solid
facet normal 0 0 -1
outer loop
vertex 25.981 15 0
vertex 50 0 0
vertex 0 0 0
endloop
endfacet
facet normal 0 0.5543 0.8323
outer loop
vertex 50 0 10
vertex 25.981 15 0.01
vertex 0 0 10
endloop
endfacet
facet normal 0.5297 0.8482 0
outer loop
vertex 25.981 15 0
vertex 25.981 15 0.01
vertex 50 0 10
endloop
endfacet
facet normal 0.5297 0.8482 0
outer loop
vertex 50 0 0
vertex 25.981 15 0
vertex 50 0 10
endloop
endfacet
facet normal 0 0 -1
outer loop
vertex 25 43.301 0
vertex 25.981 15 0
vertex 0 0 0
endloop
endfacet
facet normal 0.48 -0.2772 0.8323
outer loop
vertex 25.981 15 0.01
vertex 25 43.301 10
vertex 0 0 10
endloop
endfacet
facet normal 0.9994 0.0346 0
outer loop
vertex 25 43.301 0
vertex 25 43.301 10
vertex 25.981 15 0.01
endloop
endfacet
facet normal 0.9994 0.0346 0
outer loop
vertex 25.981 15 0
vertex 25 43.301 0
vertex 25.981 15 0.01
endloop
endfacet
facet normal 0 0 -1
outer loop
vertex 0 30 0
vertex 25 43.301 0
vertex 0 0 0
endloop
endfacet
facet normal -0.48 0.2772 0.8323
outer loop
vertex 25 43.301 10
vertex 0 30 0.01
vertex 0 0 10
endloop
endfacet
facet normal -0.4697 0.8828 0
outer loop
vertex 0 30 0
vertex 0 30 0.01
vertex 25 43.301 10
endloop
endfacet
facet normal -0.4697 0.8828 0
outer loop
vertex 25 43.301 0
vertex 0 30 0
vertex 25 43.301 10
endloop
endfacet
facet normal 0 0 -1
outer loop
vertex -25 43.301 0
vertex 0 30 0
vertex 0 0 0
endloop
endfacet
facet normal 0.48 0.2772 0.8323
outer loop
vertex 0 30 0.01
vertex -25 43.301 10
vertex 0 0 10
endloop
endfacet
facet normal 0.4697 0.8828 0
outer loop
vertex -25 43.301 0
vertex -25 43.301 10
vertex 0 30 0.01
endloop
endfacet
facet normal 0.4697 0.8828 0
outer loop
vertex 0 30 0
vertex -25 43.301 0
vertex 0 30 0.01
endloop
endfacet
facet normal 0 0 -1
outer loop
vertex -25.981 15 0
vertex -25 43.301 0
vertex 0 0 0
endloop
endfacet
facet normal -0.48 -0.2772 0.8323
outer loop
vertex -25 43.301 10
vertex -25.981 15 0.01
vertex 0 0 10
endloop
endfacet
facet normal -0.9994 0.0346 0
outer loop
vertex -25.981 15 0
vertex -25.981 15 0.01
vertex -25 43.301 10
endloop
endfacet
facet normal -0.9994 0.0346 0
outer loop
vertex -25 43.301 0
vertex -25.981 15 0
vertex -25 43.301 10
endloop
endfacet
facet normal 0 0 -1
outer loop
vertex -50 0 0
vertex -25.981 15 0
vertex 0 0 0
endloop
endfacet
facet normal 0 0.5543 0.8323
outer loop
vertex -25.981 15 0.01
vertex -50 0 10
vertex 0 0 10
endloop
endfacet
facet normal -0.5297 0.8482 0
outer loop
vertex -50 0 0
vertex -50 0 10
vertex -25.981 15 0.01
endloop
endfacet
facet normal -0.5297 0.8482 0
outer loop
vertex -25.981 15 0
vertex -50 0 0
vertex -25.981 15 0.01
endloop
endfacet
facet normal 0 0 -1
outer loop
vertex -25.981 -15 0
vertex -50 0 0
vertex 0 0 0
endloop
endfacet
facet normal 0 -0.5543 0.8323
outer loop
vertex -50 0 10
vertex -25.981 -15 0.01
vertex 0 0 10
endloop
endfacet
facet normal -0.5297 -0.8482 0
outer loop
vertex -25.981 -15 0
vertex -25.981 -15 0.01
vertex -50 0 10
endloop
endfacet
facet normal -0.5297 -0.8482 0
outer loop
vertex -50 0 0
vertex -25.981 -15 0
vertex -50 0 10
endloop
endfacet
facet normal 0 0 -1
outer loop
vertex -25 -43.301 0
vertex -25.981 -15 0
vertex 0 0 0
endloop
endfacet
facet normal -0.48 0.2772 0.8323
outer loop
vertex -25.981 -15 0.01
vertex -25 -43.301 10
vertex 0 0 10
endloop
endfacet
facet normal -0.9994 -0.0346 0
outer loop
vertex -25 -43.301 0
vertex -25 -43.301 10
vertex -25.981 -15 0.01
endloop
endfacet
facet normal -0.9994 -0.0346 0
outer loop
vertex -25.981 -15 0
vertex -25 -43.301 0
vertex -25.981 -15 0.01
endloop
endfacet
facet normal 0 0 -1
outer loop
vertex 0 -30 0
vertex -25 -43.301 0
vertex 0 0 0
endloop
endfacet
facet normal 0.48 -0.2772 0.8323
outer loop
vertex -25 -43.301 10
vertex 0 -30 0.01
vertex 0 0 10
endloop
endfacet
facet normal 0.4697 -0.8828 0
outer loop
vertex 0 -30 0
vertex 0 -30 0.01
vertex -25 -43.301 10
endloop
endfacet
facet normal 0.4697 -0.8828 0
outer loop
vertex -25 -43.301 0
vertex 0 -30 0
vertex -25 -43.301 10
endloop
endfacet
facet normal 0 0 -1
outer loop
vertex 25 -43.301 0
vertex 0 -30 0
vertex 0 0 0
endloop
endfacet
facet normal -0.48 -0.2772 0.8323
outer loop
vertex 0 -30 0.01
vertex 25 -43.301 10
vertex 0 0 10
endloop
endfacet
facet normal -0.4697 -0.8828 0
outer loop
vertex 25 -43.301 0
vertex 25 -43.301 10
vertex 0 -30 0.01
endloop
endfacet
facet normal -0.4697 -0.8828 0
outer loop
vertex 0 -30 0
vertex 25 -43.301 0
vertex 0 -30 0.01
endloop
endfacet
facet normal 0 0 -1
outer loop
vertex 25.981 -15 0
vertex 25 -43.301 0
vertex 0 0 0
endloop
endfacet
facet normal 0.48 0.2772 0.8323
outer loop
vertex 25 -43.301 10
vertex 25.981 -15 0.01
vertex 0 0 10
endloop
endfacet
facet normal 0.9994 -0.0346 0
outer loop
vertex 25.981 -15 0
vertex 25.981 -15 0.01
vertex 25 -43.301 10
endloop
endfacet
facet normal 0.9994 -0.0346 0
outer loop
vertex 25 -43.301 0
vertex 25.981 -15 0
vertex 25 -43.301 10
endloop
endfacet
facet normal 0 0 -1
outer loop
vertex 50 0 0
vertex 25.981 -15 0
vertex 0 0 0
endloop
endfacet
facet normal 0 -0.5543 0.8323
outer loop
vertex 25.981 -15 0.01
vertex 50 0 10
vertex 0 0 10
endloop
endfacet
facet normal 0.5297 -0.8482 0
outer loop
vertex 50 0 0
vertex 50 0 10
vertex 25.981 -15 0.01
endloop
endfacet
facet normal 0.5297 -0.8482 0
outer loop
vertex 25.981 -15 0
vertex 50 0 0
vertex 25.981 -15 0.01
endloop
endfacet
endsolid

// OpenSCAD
function makeFaces(bc,b1,b2,tc,t1,t2)
    = [ [bc,b1,b2],
        [tc,t2,t1],
//        [tc,t1,b1],
//        [bc,tc,b1],
//        [tc,b2,t2],
//        [bc,b2,tc],
        [t1,t2,b2],
        [t1,b2,b1] ];

function joinStars(bottomCenter,bottomRing,topCenter,topRing) =
    [
        concat([bottomCenter],[topCenter],
        bottomRing,topRing),
        let(n=len(bottomRing),bc=0,tc=1,br=2,tr=br+n)
        [for(i=[0:n-1]) for(f=makeFaces(bc,br+i,br+(i+1)%n,tc,tr+i,tr+(i+1)%n)) f]
    ];
        
module polyhedronFaces(points=[], faces=[], radius=1) {
    for (f=faces) {
        hull() {
            for(p=f) {
                translate(points[p]) sphere(r=radius);
            }
        }
    }
}

module starCylinder(points=12, bottomCenter=[0,0,0], bottomEvenZ=0, bottomOddZ=0,
	bottomEvenRadius=50, bottomOddRadius=30, topCenter=[0,0,10], topEvenZ=10, topOddZ=0.01,
	topEvenRadius=50, topOddRadius=30) {
	
	bottom = [for(i=[0:points-1]) let(angle=360/points*i)
					i%2 ? [bottomOddRadius*cos(angle),bottomOddRadius*sin(angle),bottomOddZ] :
						  [bottomEvenRadius*cos(angle),bottomEvenRadius*sin(angle),bottomEvenZ]];
	top = [for(i=[0:points-1]) let(angle=360/points*i)
					i%2 ? [topOddRadius*cos(angle),topOddRadius*sin(angle),topOddZ] :
						  [topEvenRadius*cos(angle),topEvenRadius*sin(angle),topEvenZ]];
    
    pointsAndFaces = joinStars(bottomCenter,bottom,topCenter,top);
    polyhedron(points=pointsAndFaces[0],faces=pointsAndFaces[1]);
}

//<skip>
starCylinder();
//</skip>
